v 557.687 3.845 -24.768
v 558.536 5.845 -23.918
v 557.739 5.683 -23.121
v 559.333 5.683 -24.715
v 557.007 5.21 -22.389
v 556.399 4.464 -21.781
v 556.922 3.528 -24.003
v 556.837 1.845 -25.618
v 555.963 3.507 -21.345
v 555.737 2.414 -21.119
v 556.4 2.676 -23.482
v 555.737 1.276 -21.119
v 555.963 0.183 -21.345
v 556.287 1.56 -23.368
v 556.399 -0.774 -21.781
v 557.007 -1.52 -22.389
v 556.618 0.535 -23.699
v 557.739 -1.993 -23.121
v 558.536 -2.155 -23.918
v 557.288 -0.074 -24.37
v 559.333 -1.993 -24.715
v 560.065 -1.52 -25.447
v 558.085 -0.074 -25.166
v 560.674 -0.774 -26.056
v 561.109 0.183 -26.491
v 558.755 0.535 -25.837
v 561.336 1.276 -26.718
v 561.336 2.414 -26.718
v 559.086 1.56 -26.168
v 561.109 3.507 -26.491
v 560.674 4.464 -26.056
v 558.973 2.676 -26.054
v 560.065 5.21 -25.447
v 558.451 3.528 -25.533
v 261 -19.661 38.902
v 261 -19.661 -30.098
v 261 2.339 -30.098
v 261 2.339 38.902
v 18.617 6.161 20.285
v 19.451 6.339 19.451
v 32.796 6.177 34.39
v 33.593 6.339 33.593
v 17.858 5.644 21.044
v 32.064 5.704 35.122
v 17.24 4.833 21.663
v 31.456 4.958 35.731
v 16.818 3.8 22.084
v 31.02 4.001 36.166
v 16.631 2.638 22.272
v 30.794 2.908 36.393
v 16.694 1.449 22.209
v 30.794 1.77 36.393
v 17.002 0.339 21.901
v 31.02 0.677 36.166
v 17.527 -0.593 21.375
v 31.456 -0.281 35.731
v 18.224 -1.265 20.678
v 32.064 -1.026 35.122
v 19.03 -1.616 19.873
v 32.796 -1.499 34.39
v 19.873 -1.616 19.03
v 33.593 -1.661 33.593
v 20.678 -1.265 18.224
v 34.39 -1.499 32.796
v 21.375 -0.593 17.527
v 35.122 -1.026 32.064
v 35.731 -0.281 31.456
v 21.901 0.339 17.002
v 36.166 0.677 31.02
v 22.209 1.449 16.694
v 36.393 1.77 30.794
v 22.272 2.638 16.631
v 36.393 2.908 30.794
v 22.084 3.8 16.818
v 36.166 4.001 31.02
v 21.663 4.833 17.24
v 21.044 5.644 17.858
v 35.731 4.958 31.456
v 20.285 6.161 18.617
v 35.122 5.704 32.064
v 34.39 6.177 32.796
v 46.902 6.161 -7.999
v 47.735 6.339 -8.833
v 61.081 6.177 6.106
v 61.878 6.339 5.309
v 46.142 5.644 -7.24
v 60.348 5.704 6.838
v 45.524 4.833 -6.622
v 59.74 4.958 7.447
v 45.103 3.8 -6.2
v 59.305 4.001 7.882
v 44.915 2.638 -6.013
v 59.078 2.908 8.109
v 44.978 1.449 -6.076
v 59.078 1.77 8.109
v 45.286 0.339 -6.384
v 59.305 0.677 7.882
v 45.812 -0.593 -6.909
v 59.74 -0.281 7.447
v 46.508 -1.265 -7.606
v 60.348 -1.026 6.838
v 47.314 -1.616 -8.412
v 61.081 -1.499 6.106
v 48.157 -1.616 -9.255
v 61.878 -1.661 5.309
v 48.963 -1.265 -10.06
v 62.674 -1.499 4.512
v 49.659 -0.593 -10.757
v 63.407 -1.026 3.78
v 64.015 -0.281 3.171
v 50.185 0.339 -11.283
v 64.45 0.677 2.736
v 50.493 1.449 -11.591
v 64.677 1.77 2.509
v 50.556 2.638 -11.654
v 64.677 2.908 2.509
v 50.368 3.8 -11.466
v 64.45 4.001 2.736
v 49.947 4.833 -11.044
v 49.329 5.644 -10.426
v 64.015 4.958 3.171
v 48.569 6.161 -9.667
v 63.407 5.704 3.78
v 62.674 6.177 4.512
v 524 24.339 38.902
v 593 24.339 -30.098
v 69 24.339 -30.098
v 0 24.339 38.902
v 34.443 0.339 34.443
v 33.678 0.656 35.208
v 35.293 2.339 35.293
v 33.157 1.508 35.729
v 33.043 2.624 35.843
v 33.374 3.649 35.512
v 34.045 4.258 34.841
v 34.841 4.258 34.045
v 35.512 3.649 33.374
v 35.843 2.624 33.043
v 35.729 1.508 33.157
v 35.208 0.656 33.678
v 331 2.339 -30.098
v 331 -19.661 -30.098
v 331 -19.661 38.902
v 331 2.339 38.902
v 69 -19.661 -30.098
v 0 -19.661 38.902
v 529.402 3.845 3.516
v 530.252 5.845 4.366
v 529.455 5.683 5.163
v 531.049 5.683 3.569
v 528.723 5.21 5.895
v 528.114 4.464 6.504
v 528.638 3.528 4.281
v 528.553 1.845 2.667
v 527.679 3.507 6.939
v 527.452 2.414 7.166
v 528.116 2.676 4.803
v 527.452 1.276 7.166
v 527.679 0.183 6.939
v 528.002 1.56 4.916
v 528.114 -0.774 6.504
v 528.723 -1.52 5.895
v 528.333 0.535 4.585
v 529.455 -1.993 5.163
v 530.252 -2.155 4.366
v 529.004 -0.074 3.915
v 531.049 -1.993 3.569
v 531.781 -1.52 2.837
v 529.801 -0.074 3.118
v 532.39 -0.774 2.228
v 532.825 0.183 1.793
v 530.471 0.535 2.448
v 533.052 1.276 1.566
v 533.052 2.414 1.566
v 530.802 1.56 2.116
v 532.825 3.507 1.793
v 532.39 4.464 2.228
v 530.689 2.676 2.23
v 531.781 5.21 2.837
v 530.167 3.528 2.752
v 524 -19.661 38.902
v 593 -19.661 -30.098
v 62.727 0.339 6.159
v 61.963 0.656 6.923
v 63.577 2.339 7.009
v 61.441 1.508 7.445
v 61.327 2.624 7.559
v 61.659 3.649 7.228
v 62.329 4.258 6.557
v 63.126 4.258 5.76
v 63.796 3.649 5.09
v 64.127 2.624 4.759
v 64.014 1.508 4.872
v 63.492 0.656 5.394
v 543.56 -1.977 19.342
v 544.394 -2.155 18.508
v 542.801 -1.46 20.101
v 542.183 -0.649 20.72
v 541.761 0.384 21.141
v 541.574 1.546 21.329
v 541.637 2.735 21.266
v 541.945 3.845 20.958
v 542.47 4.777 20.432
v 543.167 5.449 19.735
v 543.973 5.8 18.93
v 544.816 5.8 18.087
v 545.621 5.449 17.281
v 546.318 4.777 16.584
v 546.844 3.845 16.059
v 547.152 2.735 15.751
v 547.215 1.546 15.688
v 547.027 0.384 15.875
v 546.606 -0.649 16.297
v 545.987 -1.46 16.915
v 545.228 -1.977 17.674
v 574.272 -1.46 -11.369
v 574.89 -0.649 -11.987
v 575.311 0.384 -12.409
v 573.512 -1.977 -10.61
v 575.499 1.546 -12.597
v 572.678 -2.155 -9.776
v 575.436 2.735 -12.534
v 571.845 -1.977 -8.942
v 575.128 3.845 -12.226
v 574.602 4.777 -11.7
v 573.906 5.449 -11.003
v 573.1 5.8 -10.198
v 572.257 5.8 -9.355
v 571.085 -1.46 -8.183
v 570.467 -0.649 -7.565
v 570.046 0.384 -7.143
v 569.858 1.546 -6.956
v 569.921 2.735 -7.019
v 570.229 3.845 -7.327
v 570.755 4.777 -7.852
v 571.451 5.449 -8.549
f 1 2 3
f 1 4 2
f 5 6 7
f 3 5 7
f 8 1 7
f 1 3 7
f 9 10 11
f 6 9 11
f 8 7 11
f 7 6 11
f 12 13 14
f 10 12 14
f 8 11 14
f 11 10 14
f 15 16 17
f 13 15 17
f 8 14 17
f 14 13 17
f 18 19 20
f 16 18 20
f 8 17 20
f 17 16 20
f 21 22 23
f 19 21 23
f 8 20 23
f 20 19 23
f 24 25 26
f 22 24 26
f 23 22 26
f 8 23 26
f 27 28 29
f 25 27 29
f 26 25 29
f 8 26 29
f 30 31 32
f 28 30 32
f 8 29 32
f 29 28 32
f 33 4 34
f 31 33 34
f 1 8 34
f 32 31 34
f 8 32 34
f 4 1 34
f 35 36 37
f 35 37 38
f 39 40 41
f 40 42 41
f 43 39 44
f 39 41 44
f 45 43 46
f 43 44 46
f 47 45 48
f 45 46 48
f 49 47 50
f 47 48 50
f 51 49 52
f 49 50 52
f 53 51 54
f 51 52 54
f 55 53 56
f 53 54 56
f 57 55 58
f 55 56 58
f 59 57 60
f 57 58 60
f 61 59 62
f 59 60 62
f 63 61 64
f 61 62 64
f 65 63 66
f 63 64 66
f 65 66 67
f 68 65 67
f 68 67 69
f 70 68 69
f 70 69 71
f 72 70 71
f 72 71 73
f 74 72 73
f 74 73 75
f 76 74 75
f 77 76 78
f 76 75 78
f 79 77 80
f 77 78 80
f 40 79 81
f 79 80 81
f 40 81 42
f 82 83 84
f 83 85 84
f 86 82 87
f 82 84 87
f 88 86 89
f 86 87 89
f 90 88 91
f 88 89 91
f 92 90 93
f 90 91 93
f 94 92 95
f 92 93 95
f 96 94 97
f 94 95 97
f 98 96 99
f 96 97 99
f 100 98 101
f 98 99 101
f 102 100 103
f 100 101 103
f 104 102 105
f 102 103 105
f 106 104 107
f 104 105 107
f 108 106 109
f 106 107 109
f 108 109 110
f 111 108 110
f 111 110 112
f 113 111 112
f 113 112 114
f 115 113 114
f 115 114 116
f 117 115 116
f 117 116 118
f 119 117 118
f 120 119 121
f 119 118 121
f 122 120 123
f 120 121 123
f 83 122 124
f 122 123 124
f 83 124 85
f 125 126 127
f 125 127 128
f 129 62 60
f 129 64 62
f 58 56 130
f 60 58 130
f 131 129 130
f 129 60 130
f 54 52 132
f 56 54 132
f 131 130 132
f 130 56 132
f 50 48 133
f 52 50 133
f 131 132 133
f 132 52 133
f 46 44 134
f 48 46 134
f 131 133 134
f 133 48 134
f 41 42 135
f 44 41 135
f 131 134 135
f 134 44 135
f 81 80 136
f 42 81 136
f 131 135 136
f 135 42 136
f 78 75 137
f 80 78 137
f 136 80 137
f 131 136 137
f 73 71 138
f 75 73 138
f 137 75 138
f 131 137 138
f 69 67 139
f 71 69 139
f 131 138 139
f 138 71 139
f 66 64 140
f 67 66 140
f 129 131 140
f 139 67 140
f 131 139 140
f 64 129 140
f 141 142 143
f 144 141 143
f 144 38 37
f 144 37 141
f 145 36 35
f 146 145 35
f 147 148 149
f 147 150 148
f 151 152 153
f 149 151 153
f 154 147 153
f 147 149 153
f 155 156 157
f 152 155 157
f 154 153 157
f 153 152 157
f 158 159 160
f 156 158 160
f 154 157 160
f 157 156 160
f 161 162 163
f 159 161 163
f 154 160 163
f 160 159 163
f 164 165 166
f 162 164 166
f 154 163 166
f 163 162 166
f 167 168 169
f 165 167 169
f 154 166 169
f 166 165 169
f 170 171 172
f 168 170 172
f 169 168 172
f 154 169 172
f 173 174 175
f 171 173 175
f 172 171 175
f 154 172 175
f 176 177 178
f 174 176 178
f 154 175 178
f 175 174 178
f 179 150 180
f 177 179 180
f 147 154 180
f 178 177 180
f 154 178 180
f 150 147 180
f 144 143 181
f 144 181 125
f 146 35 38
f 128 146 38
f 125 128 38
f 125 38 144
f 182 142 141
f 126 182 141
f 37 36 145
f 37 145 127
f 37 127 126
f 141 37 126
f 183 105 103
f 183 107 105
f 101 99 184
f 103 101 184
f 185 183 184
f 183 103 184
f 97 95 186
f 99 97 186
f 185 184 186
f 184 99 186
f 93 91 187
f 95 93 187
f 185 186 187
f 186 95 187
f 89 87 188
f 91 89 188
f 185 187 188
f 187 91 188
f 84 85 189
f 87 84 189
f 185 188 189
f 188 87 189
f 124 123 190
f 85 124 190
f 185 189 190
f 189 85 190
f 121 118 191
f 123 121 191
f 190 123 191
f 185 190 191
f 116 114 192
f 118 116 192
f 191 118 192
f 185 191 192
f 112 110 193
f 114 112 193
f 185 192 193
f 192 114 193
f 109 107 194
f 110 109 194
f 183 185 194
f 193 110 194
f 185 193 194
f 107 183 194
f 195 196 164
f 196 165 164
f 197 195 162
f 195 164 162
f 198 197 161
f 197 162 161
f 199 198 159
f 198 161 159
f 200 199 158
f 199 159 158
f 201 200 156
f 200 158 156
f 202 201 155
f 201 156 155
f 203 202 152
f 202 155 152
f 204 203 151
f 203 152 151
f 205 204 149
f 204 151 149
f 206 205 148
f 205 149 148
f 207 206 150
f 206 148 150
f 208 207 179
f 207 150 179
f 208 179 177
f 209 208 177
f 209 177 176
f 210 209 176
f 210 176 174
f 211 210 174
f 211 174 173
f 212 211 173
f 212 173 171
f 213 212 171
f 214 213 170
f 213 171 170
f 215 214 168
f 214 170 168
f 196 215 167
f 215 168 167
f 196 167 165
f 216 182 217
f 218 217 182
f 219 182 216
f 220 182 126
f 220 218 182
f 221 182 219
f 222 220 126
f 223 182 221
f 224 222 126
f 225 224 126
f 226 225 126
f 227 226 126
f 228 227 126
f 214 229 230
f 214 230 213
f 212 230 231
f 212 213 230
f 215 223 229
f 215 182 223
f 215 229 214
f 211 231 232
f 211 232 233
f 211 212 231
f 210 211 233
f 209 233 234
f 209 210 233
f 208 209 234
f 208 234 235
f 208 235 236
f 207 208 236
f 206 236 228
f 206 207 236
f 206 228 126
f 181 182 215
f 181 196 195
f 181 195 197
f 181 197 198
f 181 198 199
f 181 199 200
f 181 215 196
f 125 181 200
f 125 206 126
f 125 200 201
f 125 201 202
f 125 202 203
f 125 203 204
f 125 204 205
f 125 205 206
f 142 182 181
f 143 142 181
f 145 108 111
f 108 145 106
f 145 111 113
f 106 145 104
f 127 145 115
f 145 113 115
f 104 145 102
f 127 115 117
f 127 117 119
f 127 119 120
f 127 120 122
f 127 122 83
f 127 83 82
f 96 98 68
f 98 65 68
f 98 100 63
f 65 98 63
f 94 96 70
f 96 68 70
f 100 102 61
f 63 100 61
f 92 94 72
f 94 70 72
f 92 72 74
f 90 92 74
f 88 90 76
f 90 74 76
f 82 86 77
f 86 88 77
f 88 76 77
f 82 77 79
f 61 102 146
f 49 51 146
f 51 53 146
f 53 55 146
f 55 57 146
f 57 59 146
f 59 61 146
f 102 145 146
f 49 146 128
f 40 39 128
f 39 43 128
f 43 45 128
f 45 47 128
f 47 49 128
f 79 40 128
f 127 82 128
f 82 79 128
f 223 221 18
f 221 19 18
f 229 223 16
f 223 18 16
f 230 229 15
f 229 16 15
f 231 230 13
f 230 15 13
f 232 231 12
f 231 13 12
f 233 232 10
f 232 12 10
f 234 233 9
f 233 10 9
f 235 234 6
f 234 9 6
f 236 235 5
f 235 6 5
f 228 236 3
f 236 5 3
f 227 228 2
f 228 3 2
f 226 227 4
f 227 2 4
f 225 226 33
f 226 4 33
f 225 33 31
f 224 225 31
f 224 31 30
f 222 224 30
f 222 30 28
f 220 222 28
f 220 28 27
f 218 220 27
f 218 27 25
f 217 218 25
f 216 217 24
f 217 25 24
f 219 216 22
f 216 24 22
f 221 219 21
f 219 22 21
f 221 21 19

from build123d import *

# Parameters (mm, degrees)
F0_W     = 44
F0_H     = 69
F1_DEPTH = 593
F2_SIZE  = 68.99999
F4_D     = 8
F4_DEPTH = 20
F4_TIP   = 2.4034424761
F5_SIZE  = 68.99999
F7_D     = 8
F7_DEPTH = 20
F7_TIP   = 2.4034424761
F8_W     = 70
F8_H     = 69
F9_DEPTH = 22


# Not quite as in the source:
# - a fillet or chamfer is up to 0.001 mm smaller than in the source, because OpenCascade refuses the exact size


with BuildPart() as f1:
    # F0 (on Right) → F1 (new body)
    with BuildSketch(Plane.YZ):
        with Locations((2.3388881236, 4.4023249735)):
            Rectangle(F0_W, F0_H)
    extrude(amount=F1_DEPTH)

    # F2 (size 69 in the source; OpenCascade refuses exactly that, so slightly less here)
    f2_edges = [f1.edges().sort_by_distance(p)[0] for p in [
        (0, 2.338888, -30.097675),
    ]]
    chamfer(f2_edges, length=F2_SIZE)

    # F4
    with Locations(Plane(origin=(19.4511624867, 0, 19.4511624867), x_dir=(0, -1, 0), z_dir=(-0.7071067812, 0, -0.7071067812))):
        with Locations((-2.3388881236, 0), (-2.3388881236, -40)):
            Hole(F4_D / 2, depth=F4_DEPTH)
            with Locations((0, 0, -(F4_DEPTH + F4_TIP / 2))):  # 118° drill point
                Cone(0, F4_D / 2, F4_TIP, mode=Mode.SUBTRACT)

    # F5 (size 69 in the source; OpenCascade refuses exactly that, so slightly less here)
    f5_edges = [f1.edges().sort_by_distance(p)[0] for p in [
        (593, 2.338888, 38.902325),
    ]]
    chamfer(f5_edges, length=F5_SIZE)

    # F7
    with Locations(Plane(origin=(281.4511624867, 0, 281.4511624867), x_dir=(0, 1, 0), z_dir=(0.7071067812, 0, 0.7071067812))):
        with Locations((1.8450106473, -371.8575412992), (1.8450106473, -411.8575412992)):
            Hole(F7_D / 2, depth=F7_DEPTH)
            with Locations((0, 0, -(F7_DEPTH + F7_TIP / 2))):  # 118° drill point
                Cone(0, F7_D / 2, F7_TIP, mode=Mode.SUBTRACT)

    # F8 (on face) → F9 (cut)
    with BuildSketch(Plane.XZ.offset(19.6611118764)):
        with Locations((296, 4.4023249735)):
            Rectangle(F8_W, F8_H)
    extrude(amount=-F9_DEPTH, mode=Mode.SUBTRACT)


solid = f1.part
